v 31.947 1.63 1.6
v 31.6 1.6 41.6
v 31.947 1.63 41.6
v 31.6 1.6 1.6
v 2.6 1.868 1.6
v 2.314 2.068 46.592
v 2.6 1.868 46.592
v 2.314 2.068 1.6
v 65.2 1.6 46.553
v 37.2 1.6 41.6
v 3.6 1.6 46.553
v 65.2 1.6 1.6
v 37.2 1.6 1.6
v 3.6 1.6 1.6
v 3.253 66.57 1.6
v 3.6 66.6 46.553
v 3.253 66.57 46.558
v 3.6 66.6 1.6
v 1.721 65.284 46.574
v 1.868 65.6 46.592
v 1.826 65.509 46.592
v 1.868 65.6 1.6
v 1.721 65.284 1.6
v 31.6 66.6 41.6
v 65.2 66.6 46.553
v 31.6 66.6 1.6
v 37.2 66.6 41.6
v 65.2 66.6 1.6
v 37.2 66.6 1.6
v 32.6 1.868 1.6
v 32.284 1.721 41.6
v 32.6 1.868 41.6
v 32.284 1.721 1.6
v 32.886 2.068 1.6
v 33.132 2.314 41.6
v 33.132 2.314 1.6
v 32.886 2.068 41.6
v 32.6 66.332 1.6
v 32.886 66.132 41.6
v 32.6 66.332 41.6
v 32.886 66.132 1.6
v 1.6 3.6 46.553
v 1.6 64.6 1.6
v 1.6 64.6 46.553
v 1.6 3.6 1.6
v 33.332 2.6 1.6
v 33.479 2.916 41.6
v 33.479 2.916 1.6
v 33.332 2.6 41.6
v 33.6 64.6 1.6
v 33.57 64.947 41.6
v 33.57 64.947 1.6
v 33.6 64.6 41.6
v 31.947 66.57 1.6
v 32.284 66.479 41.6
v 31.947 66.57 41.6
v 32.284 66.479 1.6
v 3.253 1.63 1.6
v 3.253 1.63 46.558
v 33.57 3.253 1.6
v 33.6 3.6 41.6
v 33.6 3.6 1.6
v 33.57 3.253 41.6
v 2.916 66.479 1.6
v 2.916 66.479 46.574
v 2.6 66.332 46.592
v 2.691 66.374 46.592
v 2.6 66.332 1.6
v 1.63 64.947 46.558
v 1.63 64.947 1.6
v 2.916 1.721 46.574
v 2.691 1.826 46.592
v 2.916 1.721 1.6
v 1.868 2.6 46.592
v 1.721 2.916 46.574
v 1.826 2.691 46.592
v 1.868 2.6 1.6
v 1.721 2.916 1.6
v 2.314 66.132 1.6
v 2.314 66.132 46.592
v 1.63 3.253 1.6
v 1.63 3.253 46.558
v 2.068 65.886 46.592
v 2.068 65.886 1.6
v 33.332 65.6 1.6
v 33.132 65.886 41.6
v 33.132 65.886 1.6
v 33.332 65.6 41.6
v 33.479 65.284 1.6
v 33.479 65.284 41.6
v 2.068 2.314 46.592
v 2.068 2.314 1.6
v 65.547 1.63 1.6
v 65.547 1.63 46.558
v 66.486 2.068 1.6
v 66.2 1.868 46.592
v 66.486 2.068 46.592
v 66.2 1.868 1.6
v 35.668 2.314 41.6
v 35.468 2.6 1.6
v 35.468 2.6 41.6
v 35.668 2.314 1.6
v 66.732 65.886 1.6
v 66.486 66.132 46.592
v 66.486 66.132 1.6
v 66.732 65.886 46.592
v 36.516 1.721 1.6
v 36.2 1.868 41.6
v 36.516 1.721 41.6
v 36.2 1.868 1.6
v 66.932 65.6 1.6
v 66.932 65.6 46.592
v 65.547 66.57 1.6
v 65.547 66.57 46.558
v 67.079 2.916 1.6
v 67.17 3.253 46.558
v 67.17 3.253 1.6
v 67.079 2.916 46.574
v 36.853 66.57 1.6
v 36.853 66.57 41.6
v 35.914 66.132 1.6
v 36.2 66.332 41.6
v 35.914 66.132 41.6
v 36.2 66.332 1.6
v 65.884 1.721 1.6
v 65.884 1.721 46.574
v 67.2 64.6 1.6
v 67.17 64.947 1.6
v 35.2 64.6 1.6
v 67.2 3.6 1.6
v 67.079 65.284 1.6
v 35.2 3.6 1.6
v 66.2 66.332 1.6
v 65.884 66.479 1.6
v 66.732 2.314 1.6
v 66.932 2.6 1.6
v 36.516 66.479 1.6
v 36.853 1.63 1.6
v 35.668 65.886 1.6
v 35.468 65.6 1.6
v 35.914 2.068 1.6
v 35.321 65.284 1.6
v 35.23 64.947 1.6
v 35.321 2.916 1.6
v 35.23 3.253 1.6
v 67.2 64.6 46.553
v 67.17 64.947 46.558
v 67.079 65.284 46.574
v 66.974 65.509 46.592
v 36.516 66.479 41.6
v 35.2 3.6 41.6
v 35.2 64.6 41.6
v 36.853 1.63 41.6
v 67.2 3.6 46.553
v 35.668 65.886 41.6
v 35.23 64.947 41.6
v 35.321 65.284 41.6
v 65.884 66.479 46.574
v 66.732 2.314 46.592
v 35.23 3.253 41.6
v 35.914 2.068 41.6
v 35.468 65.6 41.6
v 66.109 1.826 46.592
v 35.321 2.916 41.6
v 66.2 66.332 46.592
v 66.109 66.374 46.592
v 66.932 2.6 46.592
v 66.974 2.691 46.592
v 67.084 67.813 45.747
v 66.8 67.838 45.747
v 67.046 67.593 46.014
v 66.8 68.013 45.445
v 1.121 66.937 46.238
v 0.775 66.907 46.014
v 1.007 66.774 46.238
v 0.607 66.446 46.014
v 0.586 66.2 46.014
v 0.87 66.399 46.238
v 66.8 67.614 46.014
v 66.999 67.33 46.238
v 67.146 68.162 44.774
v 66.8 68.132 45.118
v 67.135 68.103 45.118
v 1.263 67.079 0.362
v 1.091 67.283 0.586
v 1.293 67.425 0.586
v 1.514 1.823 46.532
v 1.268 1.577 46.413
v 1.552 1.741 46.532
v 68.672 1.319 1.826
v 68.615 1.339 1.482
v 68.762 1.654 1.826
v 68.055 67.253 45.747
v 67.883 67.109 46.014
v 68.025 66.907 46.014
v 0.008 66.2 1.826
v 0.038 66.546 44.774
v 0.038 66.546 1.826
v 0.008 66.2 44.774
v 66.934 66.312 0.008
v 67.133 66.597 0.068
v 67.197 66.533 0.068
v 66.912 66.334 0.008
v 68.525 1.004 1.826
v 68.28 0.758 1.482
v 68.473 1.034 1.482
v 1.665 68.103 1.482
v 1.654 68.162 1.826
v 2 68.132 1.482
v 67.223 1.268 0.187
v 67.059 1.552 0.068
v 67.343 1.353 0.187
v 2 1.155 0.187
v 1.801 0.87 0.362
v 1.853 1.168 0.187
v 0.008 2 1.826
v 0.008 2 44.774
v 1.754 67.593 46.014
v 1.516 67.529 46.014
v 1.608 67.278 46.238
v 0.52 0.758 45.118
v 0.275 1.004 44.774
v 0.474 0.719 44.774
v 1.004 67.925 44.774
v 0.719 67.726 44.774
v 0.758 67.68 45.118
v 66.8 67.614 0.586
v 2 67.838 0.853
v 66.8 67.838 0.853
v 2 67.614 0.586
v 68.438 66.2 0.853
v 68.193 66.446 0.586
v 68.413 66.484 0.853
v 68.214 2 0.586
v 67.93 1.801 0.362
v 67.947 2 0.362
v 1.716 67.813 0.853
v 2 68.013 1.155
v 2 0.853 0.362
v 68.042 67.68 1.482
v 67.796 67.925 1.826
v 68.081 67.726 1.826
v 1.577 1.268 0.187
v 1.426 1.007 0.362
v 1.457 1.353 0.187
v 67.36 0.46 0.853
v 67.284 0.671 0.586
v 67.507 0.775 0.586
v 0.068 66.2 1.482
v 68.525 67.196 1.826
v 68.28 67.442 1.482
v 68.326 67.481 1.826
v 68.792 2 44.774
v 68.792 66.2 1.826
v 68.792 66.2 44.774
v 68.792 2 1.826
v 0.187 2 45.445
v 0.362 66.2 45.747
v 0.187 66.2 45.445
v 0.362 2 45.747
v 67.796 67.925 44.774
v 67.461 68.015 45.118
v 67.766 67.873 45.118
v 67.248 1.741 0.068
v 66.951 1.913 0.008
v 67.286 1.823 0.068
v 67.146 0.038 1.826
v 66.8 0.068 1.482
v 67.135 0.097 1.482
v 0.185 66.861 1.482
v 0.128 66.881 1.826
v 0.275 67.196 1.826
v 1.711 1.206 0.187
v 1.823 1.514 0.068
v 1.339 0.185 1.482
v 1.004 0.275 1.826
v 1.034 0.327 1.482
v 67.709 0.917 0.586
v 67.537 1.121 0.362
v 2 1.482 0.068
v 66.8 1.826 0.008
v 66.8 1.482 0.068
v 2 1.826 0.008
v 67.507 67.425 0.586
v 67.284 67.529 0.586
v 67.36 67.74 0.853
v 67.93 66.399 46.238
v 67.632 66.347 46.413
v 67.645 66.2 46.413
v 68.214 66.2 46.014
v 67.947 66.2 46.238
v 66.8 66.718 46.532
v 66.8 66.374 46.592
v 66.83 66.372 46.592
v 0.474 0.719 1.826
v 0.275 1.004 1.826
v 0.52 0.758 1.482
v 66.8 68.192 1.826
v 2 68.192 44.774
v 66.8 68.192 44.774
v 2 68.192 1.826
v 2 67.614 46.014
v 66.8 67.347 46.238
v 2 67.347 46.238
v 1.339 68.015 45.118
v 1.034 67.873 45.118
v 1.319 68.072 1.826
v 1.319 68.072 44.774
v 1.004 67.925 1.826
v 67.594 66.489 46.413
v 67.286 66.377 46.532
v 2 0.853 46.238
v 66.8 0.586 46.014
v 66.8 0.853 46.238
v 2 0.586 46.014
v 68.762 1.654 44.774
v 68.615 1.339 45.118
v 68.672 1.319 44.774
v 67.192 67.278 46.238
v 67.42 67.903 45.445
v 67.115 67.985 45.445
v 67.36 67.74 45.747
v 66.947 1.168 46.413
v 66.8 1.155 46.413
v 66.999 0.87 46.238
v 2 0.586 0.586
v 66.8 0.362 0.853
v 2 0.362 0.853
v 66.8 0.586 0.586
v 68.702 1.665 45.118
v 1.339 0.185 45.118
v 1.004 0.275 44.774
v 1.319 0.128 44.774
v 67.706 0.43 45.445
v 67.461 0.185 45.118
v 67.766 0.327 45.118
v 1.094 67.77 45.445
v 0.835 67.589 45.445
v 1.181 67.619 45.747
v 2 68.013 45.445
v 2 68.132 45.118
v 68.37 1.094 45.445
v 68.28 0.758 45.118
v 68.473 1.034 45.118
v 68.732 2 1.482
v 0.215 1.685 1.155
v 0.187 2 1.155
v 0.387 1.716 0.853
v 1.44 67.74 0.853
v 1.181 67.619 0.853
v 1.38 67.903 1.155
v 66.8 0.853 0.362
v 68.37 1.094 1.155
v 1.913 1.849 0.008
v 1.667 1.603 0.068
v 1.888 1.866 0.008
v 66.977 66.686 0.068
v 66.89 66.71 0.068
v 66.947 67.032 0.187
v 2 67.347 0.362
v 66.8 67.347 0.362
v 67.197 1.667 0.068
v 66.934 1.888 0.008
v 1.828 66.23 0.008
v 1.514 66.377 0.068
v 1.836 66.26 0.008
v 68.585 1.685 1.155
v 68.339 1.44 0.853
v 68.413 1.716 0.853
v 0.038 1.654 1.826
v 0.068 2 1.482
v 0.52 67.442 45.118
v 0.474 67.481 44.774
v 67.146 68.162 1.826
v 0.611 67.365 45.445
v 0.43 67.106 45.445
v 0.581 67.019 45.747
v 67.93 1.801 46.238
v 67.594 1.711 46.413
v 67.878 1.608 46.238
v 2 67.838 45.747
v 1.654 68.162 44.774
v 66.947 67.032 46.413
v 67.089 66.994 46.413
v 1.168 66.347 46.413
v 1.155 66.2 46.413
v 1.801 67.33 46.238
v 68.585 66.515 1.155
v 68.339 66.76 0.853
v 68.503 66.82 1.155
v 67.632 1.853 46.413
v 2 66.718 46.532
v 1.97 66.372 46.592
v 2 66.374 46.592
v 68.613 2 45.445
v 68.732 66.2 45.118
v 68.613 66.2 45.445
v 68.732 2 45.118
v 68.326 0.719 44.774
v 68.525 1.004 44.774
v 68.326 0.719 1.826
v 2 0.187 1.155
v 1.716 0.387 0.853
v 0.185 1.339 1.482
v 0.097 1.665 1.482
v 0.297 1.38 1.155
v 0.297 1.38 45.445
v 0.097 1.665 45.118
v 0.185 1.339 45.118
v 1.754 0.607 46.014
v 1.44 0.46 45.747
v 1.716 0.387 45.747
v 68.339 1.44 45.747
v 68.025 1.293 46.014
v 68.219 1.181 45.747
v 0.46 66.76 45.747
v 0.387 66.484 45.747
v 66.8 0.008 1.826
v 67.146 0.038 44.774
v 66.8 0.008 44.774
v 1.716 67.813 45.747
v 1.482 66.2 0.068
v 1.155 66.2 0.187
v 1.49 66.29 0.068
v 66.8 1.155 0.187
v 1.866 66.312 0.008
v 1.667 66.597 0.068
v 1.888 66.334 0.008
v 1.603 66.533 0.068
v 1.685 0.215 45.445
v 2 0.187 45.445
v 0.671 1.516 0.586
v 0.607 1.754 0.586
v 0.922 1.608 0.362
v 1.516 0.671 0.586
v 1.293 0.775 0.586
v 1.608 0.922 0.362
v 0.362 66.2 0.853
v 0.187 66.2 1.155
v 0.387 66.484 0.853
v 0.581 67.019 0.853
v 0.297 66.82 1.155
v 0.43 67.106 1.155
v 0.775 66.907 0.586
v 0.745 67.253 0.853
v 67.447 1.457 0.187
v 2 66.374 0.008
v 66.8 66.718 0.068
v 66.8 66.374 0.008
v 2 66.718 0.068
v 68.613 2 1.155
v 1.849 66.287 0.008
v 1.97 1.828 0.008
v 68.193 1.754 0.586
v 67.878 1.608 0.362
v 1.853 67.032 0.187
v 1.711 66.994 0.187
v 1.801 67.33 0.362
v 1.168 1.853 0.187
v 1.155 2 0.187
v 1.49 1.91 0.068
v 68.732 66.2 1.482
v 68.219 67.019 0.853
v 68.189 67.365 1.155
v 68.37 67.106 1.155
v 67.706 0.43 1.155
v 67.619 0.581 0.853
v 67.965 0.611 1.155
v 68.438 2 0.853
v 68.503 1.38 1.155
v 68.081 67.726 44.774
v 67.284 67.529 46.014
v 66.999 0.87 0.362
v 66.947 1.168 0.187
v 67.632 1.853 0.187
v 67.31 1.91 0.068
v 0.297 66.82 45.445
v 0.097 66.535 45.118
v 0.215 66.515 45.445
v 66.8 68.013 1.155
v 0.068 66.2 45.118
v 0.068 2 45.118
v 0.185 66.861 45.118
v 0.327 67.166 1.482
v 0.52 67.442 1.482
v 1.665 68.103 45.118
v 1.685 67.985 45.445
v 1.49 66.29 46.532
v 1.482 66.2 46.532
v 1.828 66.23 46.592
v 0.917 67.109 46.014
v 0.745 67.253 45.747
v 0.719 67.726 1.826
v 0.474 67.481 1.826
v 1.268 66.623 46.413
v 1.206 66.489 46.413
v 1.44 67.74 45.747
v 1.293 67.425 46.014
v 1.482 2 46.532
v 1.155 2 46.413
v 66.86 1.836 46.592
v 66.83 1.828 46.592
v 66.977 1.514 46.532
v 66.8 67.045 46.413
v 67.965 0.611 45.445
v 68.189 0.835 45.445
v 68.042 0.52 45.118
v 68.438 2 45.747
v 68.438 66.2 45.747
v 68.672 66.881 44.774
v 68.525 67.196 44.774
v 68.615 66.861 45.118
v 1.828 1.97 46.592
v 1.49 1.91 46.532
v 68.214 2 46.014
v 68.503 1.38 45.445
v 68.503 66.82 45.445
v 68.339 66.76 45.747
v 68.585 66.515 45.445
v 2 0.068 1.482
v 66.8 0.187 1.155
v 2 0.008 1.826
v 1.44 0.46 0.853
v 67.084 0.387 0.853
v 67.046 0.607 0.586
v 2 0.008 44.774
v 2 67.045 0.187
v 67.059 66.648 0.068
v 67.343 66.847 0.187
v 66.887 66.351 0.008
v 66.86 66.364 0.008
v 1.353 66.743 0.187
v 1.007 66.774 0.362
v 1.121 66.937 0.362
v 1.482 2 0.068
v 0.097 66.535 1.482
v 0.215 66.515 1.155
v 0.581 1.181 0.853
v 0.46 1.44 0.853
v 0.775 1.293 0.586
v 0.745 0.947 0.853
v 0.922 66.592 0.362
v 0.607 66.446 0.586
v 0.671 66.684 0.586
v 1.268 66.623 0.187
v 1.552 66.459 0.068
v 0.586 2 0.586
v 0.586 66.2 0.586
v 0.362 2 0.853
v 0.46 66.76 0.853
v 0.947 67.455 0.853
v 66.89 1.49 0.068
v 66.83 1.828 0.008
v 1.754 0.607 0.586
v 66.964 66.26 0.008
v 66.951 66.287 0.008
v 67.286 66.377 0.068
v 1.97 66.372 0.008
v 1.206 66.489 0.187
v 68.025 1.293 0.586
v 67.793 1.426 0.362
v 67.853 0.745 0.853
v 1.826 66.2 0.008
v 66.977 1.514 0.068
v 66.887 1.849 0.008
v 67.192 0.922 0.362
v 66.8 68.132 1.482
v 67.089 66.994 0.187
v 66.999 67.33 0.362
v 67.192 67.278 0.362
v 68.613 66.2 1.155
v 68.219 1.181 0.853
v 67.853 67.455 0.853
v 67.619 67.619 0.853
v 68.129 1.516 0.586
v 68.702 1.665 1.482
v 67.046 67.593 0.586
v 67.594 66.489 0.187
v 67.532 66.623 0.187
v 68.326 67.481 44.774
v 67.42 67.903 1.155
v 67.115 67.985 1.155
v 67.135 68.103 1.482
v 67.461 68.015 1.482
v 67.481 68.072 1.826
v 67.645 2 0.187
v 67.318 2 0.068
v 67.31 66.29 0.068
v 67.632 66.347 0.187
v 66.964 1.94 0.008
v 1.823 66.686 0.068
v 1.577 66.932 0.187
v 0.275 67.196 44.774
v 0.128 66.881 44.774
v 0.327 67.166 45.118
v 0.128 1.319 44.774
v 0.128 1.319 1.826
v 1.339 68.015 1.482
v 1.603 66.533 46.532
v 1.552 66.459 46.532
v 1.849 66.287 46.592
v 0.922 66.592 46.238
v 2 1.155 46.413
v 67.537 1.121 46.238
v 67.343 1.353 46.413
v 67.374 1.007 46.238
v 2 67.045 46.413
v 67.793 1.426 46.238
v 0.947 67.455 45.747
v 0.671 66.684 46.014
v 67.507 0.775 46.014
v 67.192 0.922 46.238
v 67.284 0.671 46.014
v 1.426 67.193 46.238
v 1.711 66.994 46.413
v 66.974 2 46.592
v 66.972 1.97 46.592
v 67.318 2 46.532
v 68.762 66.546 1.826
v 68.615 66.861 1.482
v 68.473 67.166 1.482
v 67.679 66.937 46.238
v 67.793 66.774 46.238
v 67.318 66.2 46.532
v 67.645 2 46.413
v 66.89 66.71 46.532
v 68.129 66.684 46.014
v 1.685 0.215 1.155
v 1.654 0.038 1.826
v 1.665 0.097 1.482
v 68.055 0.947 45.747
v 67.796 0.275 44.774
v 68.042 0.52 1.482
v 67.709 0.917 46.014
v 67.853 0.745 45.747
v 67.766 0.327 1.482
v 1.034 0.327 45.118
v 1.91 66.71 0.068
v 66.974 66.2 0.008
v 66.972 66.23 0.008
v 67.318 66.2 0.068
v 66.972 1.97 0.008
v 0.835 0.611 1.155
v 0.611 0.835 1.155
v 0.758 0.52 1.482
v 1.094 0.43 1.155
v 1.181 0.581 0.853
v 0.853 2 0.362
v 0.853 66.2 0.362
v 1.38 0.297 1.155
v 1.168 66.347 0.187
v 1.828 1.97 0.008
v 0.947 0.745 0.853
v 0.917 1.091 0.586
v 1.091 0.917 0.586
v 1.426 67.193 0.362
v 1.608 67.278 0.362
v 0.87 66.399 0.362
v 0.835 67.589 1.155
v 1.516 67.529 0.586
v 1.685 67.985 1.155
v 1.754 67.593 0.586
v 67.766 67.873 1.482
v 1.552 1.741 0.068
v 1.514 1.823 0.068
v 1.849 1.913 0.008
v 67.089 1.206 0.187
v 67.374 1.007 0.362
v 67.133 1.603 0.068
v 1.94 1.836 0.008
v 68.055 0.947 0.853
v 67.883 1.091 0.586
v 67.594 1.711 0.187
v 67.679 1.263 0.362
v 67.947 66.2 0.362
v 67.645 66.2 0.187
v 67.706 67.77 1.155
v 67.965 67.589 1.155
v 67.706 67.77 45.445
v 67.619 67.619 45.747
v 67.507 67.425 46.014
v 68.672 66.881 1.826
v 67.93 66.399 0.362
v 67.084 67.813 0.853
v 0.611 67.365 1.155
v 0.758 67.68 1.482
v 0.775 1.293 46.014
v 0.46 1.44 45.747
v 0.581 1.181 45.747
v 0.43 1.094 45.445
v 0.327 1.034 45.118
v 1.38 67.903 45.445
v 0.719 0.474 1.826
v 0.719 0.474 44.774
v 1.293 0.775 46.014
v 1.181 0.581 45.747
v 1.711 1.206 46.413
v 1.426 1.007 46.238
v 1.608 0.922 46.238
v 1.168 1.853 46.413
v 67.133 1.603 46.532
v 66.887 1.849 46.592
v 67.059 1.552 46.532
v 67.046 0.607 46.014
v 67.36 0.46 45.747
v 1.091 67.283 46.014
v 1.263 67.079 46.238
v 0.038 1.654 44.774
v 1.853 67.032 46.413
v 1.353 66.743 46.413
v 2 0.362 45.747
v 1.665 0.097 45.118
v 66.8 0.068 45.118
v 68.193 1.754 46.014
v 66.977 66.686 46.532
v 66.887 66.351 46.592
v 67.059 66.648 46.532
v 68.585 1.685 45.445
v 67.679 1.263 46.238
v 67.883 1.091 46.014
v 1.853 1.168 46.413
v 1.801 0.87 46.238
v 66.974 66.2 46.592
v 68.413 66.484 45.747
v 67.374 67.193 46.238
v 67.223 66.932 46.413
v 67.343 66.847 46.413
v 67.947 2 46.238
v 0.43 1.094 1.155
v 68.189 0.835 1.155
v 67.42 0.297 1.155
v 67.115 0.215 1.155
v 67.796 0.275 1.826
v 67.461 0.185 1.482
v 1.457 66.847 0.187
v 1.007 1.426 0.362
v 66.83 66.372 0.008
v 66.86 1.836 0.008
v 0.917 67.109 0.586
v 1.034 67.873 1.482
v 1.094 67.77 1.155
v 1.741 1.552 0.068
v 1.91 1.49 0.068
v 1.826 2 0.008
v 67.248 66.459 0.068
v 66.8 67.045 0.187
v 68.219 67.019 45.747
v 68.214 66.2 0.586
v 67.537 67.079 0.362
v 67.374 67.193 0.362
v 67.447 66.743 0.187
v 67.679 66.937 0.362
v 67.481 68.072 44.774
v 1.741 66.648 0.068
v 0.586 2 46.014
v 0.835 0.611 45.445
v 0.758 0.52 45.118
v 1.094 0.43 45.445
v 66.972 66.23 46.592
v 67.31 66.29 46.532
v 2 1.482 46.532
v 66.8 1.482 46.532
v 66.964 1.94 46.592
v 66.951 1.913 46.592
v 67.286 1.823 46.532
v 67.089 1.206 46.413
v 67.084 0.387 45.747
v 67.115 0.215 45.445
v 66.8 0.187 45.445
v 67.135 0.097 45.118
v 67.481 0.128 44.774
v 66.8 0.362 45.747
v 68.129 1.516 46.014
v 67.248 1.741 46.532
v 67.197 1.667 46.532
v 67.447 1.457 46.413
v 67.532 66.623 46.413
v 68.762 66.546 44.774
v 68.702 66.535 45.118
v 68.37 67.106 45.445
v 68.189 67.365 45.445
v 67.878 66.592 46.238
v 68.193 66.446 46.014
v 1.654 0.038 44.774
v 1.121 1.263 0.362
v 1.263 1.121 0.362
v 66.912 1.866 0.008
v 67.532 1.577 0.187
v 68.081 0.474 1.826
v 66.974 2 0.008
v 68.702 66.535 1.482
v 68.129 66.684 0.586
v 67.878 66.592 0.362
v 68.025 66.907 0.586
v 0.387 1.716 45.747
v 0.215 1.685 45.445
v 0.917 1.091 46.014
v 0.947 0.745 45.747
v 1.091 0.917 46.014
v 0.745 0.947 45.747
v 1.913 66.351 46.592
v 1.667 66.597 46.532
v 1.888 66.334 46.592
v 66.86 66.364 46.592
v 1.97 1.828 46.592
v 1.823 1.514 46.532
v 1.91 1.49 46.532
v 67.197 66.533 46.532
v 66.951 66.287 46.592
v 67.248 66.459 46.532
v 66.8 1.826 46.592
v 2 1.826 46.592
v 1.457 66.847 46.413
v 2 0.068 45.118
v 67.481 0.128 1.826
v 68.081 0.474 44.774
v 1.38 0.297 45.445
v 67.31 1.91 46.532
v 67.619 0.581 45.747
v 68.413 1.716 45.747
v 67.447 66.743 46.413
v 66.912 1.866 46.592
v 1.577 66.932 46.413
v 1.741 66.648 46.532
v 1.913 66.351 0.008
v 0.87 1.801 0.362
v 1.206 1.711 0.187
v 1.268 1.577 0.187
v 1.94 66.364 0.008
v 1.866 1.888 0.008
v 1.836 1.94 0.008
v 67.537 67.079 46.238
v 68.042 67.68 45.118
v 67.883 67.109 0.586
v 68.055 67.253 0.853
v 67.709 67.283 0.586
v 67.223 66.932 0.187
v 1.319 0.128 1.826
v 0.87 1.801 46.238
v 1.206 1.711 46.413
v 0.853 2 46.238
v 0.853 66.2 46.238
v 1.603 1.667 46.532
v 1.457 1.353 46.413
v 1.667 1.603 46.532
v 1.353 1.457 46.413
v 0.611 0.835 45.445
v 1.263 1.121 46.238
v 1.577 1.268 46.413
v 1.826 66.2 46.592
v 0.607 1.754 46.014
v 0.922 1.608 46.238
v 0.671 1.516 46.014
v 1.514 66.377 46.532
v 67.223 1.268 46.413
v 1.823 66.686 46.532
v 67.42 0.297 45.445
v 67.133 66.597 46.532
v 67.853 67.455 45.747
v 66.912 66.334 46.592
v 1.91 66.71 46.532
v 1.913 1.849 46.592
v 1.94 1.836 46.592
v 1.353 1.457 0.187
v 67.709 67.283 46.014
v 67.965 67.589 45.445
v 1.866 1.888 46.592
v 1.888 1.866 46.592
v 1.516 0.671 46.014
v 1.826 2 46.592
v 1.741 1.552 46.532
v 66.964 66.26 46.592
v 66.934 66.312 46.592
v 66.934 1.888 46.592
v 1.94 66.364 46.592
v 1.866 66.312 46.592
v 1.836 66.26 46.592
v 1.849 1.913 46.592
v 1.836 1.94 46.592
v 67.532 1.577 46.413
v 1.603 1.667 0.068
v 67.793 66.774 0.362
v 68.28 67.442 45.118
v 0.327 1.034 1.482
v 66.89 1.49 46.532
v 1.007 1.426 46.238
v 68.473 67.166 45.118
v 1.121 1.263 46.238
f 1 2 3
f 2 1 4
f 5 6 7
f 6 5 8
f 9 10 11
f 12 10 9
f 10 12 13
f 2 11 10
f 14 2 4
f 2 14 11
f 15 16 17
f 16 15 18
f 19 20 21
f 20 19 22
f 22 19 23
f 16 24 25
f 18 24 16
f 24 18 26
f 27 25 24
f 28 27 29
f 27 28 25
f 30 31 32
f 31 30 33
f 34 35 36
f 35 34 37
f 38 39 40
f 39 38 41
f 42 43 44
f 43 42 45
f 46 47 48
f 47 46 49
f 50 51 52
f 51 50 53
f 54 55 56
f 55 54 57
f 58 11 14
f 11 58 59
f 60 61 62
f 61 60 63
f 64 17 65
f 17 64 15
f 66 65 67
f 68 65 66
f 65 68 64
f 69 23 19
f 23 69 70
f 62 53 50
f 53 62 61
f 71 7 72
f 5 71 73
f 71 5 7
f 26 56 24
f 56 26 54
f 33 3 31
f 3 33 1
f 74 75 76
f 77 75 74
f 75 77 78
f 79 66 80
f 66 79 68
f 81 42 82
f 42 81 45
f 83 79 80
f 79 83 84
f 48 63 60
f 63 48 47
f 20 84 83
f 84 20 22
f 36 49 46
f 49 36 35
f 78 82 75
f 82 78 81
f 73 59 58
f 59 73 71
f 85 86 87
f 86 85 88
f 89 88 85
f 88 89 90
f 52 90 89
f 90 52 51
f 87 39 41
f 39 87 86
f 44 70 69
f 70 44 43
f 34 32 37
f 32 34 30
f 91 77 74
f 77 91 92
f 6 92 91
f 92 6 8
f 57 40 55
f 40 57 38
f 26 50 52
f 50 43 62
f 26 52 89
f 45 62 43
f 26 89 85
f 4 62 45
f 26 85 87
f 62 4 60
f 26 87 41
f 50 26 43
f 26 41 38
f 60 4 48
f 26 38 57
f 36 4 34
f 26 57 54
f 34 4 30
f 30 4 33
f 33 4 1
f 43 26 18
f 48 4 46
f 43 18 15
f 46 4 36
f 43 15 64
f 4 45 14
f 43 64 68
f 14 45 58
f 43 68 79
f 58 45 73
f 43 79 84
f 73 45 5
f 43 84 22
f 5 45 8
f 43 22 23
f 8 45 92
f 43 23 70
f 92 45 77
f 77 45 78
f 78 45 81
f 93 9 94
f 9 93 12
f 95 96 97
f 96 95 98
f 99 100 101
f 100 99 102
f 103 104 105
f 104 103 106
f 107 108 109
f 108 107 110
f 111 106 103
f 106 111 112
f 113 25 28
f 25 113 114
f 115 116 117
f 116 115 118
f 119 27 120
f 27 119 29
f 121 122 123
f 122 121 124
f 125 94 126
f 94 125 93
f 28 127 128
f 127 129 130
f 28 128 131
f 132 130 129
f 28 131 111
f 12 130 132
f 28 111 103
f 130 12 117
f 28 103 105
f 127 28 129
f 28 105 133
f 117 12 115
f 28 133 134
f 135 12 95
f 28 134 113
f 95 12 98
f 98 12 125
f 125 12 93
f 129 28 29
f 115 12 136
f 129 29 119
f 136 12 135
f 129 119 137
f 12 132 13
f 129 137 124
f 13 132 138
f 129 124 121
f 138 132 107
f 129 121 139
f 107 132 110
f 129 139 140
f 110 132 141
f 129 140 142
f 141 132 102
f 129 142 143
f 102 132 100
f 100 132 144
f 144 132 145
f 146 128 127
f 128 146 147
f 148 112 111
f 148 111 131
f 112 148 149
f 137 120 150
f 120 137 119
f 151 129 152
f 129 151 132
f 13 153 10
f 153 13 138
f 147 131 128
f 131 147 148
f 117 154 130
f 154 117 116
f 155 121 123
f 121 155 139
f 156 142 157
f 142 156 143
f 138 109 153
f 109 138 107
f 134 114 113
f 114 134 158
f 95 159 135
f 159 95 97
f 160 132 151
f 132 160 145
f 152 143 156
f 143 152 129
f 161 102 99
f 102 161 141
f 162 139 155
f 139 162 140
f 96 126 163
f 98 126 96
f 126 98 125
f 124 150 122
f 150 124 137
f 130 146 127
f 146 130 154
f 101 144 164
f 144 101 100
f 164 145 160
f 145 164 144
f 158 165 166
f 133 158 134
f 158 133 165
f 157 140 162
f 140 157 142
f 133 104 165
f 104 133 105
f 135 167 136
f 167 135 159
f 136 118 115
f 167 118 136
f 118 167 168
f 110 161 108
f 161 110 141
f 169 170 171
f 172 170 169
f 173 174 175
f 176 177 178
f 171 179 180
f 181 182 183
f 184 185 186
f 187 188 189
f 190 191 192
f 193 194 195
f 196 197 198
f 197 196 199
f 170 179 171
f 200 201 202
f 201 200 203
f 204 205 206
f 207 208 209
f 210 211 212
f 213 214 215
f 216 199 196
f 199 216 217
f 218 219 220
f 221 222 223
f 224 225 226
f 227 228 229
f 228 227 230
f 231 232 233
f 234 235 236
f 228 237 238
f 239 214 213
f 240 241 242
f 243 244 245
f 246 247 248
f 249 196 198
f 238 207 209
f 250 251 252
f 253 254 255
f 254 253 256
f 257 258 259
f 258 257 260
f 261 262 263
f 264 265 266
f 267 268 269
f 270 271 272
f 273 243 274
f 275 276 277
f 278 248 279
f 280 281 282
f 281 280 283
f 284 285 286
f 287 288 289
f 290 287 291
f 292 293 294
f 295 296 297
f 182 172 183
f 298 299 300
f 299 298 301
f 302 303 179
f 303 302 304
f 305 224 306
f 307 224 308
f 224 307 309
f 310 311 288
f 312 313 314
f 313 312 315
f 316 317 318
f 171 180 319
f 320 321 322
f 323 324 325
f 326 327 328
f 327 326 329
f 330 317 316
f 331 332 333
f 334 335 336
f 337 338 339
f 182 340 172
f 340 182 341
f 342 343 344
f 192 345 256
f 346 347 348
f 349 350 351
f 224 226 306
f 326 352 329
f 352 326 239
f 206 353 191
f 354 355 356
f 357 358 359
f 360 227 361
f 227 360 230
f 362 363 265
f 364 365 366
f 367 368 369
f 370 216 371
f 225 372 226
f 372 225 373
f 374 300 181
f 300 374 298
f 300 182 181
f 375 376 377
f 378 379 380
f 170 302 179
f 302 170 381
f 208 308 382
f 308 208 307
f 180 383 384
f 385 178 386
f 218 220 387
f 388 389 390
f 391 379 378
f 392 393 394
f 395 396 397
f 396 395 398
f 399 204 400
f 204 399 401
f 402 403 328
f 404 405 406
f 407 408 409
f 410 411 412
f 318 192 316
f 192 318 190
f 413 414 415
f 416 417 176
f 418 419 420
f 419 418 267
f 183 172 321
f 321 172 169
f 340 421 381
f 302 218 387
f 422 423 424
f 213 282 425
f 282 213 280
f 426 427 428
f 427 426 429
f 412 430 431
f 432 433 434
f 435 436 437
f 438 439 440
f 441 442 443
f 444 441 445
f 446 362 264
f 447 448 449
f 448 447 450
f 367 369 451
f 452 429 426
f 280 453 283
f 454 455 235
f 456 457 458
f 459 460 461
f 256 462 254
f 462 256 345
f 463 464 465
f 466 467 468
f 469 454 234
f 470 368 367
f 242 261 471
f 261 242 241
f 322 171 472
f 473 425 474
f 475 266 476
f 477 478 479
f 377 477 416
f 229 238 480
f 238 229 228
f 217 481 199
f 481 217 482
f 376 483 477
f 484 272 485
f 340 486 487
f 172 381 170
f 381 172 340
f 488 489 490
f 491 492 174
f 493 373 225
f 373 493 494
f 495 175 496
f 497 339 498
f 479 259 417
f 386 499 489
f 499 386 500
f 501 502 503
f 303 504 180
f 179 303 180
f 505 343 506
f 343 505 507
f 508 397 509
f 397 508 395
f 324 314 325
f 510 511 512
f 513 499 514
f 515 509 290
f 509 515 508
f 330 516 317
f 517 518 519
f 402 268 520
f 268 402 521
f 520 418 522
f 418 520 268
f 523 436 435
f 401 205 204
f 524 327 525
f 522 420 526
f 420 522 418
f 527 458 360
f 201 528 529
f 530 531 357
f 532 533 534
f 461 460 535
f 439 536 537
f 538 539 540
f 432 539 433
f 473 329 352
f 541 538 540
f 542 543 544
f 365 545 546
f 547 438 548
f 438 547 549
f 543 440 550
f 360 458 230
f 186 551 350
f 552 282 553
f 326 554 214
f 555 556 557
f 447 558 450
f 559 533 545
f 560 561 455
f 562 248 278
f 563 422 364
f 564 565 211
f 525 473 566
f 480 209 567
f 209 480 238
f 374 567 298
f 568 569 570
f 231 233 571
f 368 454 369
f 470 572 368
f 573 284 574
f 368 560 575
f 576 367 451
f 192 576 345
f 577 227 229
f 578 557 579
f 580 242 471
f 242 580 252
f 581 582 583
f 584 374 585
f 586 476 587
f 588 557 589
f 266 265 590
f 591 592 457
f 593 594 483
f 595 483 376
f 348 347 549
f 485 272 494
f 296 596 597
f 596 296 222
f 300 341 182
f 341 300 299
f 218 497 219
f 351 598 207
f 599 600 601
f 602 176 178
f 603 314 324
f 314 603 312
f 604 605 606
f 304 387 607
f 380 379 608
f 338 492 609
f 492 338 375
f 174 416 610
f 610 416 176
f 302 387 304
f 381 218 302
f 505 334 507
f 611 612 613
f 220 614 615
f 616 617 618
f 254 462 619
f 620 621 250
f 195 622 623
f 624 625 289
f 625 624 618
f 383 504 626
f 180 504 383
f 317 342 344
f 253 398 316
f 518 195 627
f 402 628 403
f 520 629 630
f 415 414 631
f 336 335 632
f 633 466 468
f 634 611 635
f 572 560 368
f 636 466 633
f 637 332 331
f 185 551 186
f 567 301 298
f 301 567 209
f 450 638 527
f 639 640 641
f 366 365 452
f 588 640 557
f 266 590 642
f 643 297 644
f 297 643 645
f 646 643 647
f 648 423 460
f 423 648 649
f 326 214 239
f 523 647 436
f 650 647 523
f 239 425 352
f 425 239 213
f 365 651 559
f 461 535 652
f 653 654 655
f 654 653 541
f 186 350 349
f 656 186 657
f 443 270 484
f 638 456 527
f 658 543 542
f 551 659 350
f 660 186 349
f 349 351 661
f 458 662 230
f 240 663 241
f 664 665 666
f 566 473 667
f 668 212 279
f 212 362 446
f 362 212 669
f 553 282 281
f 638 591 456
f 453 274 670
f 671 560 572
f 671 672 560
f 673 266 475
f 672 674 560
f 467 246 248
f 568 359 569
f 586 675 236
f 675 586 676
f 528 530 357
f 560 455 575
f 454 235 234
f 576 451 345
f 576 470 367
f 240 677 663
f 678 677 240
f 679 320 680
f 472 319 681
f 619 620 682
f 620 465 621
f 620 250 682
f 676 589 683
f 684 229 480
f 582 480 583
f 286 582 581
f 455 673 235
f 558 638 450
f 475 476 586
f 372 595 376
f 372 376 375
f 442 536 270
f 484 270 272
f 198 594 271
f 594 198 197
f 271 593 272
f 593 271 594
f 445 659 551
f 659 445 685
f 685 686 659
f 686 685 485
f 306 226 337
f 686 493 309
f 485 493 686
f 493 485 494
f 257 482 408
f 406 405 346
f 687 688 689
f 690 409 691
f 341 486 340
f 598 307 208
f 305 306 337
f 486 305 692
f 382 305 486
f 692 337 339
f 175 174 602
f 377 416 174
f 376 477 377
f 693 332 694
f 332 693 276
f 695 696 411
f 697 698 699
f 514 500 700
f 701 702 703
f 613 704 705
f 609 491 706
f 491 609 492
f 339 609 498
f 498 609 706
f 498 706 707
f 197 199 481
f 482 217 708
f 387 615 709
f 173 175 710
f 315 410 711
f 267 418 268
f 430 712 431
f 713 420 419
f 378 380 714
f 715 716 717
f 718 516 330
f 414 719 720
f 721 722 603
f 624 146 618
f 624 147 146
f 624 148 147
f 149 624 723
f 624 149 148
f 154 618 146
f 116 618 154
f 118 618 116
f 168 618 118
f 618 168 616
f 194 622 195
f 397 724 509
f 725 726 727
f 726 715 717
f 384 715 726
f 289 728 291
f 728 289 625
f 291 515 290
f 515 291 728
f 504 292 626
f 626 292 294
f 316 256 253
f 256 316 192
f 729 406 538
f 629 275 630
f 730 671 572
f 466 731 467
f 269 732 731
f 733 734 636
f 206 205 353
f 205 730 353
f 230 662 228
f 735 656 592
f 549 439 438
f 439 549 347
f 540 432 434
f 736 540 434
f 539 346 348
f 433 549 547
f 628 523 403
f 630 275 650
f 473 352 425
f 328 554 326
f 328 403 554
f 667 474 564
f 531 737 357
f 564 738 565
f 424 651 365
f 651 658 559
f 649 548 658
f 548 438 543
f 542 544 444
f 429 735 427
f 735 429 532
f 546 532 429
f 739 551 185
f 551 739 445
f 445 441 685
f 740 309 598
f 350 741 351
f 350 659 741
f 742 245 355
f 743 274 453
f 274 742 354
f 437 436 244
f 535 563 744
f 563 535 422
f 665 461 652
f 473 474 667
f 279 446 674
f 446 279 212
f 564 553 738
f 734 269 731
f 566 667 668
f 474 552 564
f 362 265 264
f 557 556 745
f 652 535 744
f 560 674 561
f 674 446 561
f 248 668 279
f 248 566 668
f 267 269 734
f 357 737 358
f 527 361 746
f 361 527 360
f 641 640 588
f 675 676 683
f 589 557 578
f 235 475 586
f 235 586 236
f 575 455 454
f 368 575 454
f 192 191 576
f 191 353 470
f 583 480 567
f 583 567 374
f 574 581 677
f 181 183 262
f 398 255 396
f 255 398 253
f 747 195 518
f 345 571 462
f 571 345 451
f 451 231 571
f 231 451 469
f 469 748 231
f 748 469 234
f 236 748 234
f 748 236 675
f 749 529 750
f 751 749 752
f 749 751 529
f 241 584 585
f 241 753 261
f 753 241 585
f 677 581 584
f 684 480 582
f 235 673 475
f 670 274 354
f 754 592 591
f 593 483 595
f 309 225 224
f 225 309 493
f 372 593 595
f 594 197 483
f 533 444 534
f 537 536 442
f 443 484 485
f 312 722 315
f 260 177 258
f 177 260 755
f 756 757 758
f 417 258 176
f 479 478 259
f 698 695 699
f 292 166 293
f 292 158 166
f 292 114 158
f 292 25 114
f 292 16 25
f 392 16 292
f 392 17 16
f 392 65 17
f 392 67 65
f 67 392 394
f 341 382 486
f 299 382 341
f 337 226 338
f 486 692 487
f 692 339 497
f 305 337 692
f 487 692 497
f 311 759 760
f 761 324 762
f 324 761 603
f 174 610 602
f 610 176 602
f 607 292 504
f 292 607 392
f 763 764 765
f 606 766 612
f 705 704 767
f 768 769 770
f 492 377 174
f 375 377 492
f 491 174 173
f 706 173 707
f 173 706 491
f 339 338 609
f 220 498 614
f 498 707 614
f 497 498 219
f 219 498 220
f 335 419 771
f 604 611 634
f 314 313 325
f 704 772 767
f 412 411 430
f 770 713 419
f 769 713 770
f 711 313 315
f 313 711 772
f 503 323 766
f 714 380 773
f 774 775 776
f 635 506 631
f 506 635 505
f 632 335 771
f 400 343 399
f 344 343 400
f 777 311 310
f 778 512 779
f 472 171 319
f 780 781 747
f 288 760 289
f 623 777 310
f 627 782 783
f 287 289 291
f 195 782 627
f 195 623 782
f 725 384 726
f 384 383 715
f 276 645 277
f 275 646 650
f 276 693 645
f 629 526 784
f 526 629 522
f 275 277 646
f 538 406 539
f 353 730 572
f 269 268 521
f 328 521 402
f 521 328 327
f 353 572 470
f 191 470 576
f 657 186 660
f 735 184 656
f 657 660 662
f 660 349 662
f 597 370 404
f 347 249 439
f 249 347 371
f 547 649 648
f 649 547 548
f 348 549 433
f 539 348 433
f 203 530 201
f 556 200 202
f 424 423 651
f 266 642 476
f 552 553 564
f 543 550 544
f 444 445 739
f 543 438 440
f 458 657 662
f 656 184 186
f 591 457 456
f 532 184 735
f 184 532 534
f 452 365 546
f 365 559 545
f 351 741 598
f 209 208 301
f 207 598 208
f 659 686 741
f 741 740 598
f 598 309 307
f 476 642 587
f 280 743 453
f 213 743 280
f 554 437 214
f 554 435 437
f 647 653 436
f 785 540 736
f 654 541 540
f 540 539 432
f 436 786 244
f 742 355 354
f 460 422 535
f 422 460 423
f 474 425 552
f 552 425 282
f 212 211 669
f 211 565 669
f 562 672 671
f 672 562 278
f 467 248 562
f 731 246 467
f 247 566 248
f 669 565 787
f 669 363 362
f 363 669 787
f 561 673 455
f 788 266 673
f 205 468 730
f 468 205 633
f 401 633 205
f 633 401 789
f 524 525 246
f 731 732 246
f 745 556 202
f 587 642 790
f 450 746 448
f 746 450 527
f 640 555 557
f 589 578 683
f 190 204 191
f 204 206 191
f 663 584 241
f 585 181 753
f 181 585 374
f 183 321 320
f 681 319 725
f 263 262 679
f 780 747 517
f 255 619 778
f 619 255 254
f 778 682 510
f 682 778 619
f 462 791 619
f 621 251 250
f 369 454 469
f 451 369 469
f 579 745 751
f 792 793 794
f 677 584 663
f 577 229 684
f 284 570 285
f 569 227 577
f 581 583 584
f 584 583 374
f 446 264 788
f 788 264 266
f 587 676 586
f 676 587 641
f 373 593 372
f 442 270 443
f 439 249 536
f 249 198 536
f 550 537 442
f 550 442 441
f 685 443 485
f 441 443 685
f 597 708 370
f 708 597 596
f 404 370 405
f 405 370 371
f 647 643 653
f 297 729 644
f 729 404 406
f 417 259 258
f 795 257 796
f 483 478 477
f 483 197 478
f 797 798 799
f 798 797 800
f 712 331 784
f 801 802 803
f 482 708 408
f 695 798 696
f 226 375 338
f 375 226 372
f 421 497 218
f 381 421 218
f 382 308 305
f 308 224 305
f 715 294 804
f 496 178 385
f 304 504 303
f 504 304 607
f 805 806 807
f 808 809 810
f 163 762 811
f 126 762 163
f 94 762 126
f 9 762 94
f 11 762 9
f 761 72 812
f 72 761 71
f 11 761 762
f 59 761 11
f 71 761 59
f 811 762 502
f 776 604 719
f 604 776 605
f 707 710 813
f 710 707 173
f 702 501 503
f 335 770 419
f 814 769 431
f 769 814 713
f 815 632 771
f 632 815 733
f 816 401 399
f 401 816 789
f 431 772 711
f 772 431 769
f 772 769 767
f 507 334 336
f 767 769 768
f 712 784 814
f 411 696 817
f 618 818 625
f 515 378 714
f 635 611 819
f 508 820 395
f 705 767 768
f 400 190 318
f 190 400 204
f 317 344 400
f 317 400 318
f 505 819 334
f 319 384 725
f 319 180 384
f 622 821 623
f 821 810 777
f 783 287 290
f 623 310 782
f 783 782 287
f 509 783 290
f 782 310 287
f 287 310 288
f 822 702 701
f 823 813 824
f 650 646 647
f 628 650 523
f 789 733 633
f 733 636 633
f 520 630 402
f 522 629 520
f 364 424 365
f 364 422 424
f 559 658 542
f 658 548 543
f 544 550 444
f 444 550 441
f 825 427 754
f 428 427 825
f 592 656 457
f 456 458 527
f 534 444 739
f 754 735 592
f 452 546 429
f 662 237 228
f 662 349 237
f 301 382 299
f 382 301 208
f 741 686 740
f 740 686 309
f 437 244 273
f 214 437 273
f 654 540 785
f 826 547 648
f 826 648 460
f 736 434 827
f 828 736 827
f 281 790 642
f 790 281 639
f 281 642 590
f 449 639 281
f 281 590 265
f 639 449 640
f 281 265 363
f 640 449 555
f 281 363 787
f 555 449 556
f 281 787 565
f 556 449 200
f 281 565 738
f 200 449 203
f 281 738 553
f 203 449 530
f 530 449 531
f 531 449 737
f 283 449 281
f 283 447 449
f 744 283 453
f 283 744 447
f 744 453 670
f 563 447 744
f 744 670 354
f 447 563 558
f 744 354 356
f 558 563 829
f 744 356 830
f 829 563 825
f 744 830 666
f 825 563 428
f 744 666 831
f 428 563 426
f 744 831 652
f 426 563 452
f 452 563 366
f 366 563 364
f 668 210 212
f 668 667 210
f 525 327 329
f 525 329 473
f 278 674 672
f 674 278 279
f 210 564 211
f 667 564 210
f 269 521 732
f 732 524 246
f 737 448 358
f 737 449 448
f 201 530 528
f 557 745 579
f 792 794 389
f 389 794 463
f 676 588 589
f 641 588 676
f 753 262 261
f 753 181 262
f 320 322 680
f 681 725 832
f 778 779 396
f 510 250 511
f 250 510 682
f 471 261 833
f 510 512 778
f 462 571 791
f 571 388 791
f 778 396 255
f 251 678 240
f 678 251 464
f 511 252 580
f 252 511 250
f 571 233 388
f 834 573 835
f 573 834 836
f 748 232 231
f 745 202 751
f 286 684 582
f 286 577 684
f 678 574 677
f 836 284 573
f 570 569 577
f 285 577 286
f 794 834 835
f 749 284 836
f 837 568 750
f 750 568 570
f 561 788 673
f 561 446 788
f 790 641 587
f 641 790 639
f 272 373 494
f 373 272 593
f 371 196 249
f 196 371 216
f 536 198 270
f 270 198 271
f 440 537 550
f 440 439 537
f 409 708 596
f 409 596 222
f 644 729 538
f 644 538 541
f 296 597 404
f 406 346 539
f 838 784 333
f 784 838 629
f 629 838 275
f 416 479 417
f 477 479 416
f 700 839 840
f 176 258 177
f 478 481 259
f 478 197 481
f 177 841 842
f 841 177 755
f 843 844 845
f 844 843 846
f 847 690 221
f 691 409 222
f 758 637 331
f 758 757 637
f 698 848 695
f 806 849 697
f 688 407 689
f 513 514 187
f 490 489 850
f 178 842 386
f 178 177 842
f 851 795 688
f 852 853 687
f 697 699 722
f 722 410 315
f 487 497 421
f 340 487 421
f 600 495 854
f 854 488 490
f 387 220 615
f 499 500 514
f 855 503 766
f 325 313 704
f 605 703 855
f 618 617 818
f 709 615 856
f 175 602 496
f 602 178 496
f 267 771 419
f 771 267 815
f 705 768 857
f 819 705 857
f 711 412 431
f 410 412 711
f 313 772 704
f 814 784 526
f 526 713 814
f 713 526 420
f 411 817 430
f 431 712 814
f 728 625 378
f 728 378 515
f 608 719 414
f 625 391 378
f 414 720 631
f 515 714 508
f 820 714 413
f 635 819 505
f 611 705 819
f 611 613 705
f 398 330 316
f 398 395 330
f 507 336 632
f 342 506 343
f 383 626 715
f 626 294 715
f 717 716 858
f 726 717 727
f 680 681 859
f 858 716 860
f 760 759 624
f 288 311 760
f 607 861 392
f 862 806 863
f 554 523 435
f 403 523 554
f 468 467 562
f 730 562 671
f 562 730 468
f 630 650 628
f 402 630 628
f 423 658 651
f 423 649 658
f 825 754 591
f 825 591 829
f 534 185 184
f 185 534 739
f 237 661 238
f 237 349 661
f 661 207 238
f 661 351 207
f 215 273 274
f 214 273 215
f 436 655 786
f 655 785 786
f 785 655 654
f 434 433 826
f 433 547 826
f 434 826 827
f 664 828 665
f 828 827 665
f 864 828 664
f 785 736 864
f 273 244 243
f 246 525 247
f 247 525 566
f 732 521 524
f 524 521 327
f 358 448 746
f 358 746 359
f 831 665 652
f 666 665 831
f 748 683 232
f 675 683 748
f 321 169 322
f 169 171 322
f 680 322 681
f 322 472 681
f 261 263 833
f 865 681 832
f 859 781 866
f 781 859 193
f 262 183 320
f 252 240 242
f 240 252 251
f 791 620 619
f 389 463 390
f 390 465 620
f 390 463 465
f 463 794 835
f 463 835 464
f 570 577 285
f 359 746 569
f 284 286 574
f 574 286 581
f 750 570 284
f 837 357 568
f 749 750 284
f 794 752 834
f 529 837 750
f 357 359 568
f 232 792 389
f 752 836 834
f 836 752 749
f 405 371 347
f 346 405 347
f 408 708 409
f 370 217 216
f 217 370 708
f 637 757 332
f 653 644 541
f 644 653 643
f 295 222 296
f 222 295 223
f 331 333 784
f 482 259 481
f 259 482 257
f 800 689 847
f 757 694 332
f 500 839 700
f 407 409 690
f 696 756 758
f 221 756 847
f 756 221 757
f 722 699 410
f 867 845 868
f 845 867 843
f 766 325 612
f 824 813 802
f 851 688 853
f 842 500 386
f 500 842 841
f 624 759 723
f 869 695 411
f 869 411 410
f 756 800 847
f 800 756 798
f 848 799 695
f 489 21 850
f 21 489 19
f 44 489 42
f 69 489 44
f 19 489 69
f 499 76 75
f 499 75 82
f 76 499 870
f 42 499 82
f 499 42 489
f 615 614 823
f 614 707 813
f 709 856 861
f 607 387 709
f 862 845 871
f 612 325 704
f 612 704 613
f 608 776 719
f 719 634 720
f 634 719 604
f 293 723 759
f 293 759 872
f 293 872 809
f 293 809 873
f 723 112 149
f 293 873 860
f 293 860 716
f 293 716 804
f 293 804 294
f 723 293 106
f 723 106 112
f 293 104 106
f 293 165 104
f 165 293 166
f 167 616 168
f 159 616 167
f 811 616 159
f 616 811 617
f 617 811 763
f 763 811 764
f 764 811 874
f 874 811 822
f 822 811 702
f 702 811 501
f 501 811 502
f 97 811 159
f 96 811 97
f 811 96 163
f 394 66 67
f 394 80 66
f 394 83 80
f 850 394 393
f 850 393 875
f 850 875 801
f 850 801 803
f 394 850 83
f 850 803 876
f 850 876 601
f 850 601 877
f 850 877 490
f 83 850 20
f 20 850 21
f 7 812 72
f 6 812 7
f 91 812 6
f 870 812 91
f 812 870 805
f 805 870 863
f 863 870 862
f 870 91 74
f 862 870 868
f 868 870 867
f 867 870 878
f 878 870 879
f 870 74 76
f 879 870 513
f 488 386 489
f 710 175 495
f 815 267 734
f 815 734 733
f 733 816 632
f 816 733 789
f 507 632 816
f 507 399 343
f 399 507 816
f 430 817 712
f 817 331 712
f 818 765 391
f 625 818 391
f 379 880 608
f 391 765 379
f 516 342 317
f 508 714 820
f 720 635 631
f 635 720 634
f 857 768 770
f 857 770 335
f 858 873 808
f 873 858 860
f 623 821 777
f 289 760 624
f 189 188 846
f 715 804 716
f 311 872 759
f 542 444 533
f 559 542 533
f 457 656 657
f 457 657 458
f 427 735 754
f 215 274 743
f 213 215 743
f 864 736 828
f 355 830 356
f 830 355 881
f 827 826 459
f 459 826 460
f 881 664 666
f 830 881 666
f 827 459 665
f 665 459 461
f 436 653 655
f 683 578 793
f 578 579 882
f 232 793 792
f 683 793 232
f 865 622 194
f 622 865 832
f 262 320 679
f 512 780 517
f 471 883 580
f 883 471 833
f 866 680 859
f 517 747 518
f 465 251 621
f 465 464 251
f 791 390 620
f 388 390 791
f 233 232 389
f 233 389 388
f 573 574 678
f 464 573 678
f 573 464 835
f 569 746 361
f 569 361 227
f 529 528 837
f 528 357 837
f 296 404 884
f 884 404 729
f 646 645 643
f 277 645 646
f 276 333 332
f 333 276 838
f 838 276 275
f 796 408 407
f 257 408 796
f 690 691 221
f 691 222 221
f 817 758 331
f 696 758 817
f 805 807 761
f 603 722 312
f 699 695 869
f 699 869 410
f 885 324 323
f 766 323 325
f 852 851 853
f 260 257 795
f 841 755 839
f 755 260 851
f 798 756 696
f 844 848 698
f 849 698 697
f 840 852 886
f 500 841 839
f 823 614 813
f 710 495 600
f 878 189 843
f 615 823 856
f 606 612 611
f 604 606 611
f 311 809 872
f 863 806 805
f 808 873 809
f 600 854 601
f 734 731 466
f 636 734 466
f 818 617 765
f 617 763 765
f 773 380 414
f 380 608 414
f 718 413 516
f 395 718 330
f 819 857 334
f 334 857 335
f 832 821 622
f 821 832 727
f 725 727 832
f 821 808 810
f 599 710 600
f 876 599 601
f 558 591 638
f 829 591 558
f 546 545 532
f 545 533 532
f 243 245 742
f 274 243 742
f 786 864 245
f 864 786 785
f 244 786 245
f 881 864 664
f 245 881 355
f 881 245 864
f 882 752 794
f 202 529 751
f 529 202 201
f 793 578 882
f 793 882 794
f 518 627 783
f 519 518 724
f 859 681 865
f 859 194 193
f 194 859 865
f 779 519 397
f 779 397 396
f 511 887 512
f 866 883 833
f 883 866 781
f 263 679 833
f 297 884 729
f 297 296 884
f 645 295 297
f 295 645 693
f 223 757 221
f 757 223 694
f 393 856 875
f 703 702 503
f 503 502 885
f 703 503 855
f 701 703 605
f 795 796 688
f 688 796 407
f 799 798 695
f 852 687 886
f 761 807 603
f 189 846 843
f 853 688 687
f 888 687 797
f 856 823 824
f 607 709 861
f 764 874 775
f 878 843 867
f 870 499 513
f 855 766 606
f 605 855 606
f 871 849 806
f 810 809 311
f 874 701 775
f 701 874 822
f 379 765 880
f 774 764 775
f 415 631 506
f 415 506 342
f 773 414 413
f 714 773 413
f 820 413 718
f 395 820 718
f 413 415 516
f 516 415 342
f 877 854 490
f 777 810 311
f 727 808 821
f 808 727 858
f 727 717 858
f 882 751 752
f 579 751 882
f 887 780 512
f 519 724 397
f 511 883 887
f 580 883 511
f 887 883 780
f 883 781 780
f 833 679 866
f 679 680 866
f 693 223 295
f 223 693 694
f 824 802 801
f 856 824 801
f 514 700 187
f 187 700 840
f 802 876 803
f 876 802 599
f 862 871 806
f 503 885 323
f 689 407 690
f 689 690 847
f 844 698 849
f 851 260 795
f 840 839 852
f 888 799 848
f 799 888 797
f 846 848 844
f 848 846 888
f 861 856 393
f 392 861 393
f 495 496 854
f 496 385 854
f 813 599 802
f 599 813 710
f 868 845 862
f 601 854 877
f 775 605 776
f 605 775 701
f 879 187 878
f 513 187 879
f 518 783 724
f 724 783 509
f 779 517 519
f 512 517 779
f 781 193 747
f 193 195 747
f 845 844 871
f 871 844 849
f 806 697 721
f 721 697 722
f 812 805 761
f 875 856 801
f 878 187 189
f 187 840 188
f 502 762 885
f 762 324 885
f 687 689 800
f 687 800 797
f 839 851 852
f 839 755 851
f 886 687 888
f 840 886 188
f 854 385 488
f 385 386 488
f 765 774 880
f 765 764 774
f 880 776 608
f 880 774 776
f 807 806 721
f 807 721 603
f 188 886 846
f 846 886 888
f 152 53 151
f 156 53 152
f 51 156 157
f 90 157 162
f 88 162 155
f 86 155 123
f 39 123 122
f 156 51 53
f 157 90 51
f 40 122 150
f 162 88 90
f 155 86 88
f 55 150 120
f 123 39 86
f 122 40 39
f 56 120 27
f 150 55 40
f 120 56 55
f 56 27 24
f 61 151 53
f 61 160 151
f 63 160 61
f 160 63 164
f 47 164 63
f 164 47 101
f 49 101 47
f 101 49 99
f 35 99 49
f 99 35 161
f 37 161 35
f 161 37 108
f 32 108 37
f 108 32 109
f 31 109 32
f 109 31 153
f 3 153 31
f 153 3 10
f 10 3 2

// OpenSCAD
// =============================================
// 3D: Box in safe
// Version: 2.0
// Author: Cascade generator
// =============================================

// Short description for models table
description = "";
version_str = "2.0";

// ----------------------------
// Параметры модели (все размеры в мм)
// ----------------------------
// Коробка делится на N отделов: section 1, section 2, ... section N
// x, y, z - подразумевают внутренние размеры. Внешние размеры вычисляются автоматически.

is_small = false;
// Ширины отсеков (по X). Любое количество
sections_x = is_small ? [10, 20, 30] : [32, 32];
// глубина по Y
inner_y    = is_small ? 20 : 65;
// внутренняя глубина во всех отсеках
inner_h    = is_small ? 10 : 45;
    
// Скругление наружного прямоугольника
radius_r     = 1;          // радиус скругления углов
sec_corner_r = 2;          // радиус скругления углов вырезов секций
minkowski_r  = 2;          // радиус скругления краёв крышки через minkowski

// Толщины
all_th       = 1.6;        // общая толщина
wall_th      = all_th;          // толщина наружных стенок
divider_th   = all_th;          // толщина перегородок
bottom_th    = all_th;          // толщина дна

// Параметры крышки (cap)
cap_top_th        = all_th;     // толщина верхней пластины крышки
cap_lip_h         = 8;     // высота юбки (захват за стенки)
cap_fit_clearance = 0.15;   // зазор между наружными стенками коробки и внутренней поверхностью юбки
cap_th            = all_th; // толщина стенки крышки; по умолчанию согласована с margin и зазором

// Насадка крышки: опустить вершины межсекционных перегородок на заданную высоту
// Делает перегородки ниже на Z, чтобы крышка/вкладыш входили без упора в перегородки
sections_to_cap_gap = 5; // мм

// Поправки размеров (фактические измерения)
sec_x_delta   = 0;     // каждая секция по X шире, чем надо
y_delta       = 0;     // каждая секция по Y шире, чем надо

// Флаги печати
print_box = true;     // печатать основание (лоток)
print_cap = false;     // печатать крышку





use <../modules.scad>;

// ----------------------------
// Настройка точности
// ----------------------------
$fn = 0;        // фиксированную сегментацию отключаем
$fa = 6;        // 5–8° обычно достаточно
$fs = 0.35;     // ≈ диаметр сопла (0.3–0.5 для сопла 0.4)
pin_fs = 0.25;  // чуть тоньше для штырей и отверстий

// Эффективные размеры с учётом поправок
sections_x_e = [ for (w = sections_x) w + sec_x_delta ];

// Вспомогательные функции суммирования
function sum_first(v, n, i=0, acc=0) = (i >= n) ? acc : sum_first(v, n, i+1, acc + v[i]);
function vec_sum(v) = sum_first(v, len(v));

cap_h = cap_top_th + cap_lip_h;   // итоговая высота крышки

// Предвычисленные вспомогательные величины (для читаемости, без изменения формул)
n_sections = len(sections_x_e);
sum_sections_x = vec_sum(sections_x_e);
outer_margin_eff = cap_fit_clearance + cap_th; // посадка крышки
cap_h_target = cap_top_th + cap_lip_h;

// ----------------------------
// Геометрия корпуса
// ----------------------------
// Общая ширина X: стены + сумма секций + перегородки между ними
inner_y_e = inner_y + y_delta;
outer_x = 2*wall_th + sum_sections_x + divider_th * max(n_sections - 1, 0);
outer_y = 2*wall_th + inner_y_e;
outer_h = bottom_th + inner_h;

// Отсеки формируются перегородками; явные вырезы не используются

// Базовый заполняющий объём (без вырезов) — внешний контур на полную высоту
module base_fill(){
    // Только внешний контур на полную высоту; срез верха делаем позже, локально по перегородкам
    rounded_prism(size=[outer_x, outer_y], h=outer_h, r=radius_r);
}

section_x_offset = wall_th;
section_y = wall_th;
// Вырезы-отсеки формируются по массиву sections_x_e
// Позиция i-го отсека: сдвиг от левой стены = сумма предыдущих ширин + перегородки между ними
function section_x_at(i) = section_x_offset + sum_first(sections_x_e, i) + divider_th * i;
module section_at(i){
    translate([section_x_at(i), section_y, bottom_th])
        rounded_prism(size=[sections_x_e[i], inner_y_e], h=inner_h, r=sec_corner_r);
}

module base(){
    // Корпус-лоток как разность наружного корпуса (с опциональным Minkowski) минус секции,
    // а затем локальный срез верхушек перегородок
    difference(){
        // Наружный корпус
        rounded_prism([outer_x, outer_y], outer_h, radius_r, minkowski_r);

        // Вырезы секций по массиву ширин (section 1..N)
        for (i = [0 : n_sections - 1])
            section_at(i);

        // Срезать верх перегородок на заданную высоту, не затрагивая наружные стены
        dividers_top_cut();
    }
}

// Сервис: левый X-край перегородки между секцией i и i+1
function divider_x_at(i) = section_x_at(i) + sections_x_e[i];

// Локальный верхний срез только по перегородкам (полосы шириной divider_th)
module dividers_top_cut(){
    // Безопасный зажим высоты среза: 0..(inner_h-eps)
    g = min(max(sections_to_cap_gap, 0), inner_h);
    if (g > 0 && n_sections > 1){
        for (i = [0 : n_sections - 2])
            translate([
                divider_x_at(i) - sec_corner_r*2,
                wall_th,
                // немного уводим вниз на eps, чтобы исключить выход выше верха
                bottom_th + inner_h - g
            ])
                cube([sec_corner_r*4+divider_th, inner_y_e, g]);
    }
}

// ---------------
// Крышка (cap)
// ---------------
// Крышка состоит из:
// - верхней пластины толщиной cap_top_th, размерами больше корпуса с каждой стороны
// - внутренней юбки высотой cap_lip_h, которая надевается на корпус с зазором cap_fit_clearance
module cap(){
    difference(){
        // Наружный контур с опциональным скруглением краёв
        rounded_prism(
            [outer_x + 2*outer_margin_eff, outer_y + 2*outer_margin_eff],
            h=cap_h_target,
            r=radius_r,
            kr=minkowski_r
        );

        // Внутренняя поверхность юбки (посадка по зазору)
        translate([cap_th, cap_th, 0])
            rounded_prism(
                size=[outer_x + 2*cap_fit_clearance, outer_y + 2*cap_fit_clearance],
                h=cap_lip_h + 2*eps(),
                r=radius_r + cap_fit_clearance
            );
    }
}

// Вывод всех фрагментов
// ----------------------------
module all_parts(){
    // Раскладка деталей по Y при одновременной печати
    x_gap = 10;  // использовать существующий зазор
    y_shift = (print_box && print_cap) ? (outer_y + x_gap) : 0;

    if (print_box) translate([0, 0, 0]) base();
    if (print_cap) translate([outer_x + x_gap, 0, 0]) upside_down(cap_h) cap();
}

// ----------------------------
// ВЫВОД МОДЕЛИ
// ----------------------------
clip_for_fragments(){ all_parts(); }
 
